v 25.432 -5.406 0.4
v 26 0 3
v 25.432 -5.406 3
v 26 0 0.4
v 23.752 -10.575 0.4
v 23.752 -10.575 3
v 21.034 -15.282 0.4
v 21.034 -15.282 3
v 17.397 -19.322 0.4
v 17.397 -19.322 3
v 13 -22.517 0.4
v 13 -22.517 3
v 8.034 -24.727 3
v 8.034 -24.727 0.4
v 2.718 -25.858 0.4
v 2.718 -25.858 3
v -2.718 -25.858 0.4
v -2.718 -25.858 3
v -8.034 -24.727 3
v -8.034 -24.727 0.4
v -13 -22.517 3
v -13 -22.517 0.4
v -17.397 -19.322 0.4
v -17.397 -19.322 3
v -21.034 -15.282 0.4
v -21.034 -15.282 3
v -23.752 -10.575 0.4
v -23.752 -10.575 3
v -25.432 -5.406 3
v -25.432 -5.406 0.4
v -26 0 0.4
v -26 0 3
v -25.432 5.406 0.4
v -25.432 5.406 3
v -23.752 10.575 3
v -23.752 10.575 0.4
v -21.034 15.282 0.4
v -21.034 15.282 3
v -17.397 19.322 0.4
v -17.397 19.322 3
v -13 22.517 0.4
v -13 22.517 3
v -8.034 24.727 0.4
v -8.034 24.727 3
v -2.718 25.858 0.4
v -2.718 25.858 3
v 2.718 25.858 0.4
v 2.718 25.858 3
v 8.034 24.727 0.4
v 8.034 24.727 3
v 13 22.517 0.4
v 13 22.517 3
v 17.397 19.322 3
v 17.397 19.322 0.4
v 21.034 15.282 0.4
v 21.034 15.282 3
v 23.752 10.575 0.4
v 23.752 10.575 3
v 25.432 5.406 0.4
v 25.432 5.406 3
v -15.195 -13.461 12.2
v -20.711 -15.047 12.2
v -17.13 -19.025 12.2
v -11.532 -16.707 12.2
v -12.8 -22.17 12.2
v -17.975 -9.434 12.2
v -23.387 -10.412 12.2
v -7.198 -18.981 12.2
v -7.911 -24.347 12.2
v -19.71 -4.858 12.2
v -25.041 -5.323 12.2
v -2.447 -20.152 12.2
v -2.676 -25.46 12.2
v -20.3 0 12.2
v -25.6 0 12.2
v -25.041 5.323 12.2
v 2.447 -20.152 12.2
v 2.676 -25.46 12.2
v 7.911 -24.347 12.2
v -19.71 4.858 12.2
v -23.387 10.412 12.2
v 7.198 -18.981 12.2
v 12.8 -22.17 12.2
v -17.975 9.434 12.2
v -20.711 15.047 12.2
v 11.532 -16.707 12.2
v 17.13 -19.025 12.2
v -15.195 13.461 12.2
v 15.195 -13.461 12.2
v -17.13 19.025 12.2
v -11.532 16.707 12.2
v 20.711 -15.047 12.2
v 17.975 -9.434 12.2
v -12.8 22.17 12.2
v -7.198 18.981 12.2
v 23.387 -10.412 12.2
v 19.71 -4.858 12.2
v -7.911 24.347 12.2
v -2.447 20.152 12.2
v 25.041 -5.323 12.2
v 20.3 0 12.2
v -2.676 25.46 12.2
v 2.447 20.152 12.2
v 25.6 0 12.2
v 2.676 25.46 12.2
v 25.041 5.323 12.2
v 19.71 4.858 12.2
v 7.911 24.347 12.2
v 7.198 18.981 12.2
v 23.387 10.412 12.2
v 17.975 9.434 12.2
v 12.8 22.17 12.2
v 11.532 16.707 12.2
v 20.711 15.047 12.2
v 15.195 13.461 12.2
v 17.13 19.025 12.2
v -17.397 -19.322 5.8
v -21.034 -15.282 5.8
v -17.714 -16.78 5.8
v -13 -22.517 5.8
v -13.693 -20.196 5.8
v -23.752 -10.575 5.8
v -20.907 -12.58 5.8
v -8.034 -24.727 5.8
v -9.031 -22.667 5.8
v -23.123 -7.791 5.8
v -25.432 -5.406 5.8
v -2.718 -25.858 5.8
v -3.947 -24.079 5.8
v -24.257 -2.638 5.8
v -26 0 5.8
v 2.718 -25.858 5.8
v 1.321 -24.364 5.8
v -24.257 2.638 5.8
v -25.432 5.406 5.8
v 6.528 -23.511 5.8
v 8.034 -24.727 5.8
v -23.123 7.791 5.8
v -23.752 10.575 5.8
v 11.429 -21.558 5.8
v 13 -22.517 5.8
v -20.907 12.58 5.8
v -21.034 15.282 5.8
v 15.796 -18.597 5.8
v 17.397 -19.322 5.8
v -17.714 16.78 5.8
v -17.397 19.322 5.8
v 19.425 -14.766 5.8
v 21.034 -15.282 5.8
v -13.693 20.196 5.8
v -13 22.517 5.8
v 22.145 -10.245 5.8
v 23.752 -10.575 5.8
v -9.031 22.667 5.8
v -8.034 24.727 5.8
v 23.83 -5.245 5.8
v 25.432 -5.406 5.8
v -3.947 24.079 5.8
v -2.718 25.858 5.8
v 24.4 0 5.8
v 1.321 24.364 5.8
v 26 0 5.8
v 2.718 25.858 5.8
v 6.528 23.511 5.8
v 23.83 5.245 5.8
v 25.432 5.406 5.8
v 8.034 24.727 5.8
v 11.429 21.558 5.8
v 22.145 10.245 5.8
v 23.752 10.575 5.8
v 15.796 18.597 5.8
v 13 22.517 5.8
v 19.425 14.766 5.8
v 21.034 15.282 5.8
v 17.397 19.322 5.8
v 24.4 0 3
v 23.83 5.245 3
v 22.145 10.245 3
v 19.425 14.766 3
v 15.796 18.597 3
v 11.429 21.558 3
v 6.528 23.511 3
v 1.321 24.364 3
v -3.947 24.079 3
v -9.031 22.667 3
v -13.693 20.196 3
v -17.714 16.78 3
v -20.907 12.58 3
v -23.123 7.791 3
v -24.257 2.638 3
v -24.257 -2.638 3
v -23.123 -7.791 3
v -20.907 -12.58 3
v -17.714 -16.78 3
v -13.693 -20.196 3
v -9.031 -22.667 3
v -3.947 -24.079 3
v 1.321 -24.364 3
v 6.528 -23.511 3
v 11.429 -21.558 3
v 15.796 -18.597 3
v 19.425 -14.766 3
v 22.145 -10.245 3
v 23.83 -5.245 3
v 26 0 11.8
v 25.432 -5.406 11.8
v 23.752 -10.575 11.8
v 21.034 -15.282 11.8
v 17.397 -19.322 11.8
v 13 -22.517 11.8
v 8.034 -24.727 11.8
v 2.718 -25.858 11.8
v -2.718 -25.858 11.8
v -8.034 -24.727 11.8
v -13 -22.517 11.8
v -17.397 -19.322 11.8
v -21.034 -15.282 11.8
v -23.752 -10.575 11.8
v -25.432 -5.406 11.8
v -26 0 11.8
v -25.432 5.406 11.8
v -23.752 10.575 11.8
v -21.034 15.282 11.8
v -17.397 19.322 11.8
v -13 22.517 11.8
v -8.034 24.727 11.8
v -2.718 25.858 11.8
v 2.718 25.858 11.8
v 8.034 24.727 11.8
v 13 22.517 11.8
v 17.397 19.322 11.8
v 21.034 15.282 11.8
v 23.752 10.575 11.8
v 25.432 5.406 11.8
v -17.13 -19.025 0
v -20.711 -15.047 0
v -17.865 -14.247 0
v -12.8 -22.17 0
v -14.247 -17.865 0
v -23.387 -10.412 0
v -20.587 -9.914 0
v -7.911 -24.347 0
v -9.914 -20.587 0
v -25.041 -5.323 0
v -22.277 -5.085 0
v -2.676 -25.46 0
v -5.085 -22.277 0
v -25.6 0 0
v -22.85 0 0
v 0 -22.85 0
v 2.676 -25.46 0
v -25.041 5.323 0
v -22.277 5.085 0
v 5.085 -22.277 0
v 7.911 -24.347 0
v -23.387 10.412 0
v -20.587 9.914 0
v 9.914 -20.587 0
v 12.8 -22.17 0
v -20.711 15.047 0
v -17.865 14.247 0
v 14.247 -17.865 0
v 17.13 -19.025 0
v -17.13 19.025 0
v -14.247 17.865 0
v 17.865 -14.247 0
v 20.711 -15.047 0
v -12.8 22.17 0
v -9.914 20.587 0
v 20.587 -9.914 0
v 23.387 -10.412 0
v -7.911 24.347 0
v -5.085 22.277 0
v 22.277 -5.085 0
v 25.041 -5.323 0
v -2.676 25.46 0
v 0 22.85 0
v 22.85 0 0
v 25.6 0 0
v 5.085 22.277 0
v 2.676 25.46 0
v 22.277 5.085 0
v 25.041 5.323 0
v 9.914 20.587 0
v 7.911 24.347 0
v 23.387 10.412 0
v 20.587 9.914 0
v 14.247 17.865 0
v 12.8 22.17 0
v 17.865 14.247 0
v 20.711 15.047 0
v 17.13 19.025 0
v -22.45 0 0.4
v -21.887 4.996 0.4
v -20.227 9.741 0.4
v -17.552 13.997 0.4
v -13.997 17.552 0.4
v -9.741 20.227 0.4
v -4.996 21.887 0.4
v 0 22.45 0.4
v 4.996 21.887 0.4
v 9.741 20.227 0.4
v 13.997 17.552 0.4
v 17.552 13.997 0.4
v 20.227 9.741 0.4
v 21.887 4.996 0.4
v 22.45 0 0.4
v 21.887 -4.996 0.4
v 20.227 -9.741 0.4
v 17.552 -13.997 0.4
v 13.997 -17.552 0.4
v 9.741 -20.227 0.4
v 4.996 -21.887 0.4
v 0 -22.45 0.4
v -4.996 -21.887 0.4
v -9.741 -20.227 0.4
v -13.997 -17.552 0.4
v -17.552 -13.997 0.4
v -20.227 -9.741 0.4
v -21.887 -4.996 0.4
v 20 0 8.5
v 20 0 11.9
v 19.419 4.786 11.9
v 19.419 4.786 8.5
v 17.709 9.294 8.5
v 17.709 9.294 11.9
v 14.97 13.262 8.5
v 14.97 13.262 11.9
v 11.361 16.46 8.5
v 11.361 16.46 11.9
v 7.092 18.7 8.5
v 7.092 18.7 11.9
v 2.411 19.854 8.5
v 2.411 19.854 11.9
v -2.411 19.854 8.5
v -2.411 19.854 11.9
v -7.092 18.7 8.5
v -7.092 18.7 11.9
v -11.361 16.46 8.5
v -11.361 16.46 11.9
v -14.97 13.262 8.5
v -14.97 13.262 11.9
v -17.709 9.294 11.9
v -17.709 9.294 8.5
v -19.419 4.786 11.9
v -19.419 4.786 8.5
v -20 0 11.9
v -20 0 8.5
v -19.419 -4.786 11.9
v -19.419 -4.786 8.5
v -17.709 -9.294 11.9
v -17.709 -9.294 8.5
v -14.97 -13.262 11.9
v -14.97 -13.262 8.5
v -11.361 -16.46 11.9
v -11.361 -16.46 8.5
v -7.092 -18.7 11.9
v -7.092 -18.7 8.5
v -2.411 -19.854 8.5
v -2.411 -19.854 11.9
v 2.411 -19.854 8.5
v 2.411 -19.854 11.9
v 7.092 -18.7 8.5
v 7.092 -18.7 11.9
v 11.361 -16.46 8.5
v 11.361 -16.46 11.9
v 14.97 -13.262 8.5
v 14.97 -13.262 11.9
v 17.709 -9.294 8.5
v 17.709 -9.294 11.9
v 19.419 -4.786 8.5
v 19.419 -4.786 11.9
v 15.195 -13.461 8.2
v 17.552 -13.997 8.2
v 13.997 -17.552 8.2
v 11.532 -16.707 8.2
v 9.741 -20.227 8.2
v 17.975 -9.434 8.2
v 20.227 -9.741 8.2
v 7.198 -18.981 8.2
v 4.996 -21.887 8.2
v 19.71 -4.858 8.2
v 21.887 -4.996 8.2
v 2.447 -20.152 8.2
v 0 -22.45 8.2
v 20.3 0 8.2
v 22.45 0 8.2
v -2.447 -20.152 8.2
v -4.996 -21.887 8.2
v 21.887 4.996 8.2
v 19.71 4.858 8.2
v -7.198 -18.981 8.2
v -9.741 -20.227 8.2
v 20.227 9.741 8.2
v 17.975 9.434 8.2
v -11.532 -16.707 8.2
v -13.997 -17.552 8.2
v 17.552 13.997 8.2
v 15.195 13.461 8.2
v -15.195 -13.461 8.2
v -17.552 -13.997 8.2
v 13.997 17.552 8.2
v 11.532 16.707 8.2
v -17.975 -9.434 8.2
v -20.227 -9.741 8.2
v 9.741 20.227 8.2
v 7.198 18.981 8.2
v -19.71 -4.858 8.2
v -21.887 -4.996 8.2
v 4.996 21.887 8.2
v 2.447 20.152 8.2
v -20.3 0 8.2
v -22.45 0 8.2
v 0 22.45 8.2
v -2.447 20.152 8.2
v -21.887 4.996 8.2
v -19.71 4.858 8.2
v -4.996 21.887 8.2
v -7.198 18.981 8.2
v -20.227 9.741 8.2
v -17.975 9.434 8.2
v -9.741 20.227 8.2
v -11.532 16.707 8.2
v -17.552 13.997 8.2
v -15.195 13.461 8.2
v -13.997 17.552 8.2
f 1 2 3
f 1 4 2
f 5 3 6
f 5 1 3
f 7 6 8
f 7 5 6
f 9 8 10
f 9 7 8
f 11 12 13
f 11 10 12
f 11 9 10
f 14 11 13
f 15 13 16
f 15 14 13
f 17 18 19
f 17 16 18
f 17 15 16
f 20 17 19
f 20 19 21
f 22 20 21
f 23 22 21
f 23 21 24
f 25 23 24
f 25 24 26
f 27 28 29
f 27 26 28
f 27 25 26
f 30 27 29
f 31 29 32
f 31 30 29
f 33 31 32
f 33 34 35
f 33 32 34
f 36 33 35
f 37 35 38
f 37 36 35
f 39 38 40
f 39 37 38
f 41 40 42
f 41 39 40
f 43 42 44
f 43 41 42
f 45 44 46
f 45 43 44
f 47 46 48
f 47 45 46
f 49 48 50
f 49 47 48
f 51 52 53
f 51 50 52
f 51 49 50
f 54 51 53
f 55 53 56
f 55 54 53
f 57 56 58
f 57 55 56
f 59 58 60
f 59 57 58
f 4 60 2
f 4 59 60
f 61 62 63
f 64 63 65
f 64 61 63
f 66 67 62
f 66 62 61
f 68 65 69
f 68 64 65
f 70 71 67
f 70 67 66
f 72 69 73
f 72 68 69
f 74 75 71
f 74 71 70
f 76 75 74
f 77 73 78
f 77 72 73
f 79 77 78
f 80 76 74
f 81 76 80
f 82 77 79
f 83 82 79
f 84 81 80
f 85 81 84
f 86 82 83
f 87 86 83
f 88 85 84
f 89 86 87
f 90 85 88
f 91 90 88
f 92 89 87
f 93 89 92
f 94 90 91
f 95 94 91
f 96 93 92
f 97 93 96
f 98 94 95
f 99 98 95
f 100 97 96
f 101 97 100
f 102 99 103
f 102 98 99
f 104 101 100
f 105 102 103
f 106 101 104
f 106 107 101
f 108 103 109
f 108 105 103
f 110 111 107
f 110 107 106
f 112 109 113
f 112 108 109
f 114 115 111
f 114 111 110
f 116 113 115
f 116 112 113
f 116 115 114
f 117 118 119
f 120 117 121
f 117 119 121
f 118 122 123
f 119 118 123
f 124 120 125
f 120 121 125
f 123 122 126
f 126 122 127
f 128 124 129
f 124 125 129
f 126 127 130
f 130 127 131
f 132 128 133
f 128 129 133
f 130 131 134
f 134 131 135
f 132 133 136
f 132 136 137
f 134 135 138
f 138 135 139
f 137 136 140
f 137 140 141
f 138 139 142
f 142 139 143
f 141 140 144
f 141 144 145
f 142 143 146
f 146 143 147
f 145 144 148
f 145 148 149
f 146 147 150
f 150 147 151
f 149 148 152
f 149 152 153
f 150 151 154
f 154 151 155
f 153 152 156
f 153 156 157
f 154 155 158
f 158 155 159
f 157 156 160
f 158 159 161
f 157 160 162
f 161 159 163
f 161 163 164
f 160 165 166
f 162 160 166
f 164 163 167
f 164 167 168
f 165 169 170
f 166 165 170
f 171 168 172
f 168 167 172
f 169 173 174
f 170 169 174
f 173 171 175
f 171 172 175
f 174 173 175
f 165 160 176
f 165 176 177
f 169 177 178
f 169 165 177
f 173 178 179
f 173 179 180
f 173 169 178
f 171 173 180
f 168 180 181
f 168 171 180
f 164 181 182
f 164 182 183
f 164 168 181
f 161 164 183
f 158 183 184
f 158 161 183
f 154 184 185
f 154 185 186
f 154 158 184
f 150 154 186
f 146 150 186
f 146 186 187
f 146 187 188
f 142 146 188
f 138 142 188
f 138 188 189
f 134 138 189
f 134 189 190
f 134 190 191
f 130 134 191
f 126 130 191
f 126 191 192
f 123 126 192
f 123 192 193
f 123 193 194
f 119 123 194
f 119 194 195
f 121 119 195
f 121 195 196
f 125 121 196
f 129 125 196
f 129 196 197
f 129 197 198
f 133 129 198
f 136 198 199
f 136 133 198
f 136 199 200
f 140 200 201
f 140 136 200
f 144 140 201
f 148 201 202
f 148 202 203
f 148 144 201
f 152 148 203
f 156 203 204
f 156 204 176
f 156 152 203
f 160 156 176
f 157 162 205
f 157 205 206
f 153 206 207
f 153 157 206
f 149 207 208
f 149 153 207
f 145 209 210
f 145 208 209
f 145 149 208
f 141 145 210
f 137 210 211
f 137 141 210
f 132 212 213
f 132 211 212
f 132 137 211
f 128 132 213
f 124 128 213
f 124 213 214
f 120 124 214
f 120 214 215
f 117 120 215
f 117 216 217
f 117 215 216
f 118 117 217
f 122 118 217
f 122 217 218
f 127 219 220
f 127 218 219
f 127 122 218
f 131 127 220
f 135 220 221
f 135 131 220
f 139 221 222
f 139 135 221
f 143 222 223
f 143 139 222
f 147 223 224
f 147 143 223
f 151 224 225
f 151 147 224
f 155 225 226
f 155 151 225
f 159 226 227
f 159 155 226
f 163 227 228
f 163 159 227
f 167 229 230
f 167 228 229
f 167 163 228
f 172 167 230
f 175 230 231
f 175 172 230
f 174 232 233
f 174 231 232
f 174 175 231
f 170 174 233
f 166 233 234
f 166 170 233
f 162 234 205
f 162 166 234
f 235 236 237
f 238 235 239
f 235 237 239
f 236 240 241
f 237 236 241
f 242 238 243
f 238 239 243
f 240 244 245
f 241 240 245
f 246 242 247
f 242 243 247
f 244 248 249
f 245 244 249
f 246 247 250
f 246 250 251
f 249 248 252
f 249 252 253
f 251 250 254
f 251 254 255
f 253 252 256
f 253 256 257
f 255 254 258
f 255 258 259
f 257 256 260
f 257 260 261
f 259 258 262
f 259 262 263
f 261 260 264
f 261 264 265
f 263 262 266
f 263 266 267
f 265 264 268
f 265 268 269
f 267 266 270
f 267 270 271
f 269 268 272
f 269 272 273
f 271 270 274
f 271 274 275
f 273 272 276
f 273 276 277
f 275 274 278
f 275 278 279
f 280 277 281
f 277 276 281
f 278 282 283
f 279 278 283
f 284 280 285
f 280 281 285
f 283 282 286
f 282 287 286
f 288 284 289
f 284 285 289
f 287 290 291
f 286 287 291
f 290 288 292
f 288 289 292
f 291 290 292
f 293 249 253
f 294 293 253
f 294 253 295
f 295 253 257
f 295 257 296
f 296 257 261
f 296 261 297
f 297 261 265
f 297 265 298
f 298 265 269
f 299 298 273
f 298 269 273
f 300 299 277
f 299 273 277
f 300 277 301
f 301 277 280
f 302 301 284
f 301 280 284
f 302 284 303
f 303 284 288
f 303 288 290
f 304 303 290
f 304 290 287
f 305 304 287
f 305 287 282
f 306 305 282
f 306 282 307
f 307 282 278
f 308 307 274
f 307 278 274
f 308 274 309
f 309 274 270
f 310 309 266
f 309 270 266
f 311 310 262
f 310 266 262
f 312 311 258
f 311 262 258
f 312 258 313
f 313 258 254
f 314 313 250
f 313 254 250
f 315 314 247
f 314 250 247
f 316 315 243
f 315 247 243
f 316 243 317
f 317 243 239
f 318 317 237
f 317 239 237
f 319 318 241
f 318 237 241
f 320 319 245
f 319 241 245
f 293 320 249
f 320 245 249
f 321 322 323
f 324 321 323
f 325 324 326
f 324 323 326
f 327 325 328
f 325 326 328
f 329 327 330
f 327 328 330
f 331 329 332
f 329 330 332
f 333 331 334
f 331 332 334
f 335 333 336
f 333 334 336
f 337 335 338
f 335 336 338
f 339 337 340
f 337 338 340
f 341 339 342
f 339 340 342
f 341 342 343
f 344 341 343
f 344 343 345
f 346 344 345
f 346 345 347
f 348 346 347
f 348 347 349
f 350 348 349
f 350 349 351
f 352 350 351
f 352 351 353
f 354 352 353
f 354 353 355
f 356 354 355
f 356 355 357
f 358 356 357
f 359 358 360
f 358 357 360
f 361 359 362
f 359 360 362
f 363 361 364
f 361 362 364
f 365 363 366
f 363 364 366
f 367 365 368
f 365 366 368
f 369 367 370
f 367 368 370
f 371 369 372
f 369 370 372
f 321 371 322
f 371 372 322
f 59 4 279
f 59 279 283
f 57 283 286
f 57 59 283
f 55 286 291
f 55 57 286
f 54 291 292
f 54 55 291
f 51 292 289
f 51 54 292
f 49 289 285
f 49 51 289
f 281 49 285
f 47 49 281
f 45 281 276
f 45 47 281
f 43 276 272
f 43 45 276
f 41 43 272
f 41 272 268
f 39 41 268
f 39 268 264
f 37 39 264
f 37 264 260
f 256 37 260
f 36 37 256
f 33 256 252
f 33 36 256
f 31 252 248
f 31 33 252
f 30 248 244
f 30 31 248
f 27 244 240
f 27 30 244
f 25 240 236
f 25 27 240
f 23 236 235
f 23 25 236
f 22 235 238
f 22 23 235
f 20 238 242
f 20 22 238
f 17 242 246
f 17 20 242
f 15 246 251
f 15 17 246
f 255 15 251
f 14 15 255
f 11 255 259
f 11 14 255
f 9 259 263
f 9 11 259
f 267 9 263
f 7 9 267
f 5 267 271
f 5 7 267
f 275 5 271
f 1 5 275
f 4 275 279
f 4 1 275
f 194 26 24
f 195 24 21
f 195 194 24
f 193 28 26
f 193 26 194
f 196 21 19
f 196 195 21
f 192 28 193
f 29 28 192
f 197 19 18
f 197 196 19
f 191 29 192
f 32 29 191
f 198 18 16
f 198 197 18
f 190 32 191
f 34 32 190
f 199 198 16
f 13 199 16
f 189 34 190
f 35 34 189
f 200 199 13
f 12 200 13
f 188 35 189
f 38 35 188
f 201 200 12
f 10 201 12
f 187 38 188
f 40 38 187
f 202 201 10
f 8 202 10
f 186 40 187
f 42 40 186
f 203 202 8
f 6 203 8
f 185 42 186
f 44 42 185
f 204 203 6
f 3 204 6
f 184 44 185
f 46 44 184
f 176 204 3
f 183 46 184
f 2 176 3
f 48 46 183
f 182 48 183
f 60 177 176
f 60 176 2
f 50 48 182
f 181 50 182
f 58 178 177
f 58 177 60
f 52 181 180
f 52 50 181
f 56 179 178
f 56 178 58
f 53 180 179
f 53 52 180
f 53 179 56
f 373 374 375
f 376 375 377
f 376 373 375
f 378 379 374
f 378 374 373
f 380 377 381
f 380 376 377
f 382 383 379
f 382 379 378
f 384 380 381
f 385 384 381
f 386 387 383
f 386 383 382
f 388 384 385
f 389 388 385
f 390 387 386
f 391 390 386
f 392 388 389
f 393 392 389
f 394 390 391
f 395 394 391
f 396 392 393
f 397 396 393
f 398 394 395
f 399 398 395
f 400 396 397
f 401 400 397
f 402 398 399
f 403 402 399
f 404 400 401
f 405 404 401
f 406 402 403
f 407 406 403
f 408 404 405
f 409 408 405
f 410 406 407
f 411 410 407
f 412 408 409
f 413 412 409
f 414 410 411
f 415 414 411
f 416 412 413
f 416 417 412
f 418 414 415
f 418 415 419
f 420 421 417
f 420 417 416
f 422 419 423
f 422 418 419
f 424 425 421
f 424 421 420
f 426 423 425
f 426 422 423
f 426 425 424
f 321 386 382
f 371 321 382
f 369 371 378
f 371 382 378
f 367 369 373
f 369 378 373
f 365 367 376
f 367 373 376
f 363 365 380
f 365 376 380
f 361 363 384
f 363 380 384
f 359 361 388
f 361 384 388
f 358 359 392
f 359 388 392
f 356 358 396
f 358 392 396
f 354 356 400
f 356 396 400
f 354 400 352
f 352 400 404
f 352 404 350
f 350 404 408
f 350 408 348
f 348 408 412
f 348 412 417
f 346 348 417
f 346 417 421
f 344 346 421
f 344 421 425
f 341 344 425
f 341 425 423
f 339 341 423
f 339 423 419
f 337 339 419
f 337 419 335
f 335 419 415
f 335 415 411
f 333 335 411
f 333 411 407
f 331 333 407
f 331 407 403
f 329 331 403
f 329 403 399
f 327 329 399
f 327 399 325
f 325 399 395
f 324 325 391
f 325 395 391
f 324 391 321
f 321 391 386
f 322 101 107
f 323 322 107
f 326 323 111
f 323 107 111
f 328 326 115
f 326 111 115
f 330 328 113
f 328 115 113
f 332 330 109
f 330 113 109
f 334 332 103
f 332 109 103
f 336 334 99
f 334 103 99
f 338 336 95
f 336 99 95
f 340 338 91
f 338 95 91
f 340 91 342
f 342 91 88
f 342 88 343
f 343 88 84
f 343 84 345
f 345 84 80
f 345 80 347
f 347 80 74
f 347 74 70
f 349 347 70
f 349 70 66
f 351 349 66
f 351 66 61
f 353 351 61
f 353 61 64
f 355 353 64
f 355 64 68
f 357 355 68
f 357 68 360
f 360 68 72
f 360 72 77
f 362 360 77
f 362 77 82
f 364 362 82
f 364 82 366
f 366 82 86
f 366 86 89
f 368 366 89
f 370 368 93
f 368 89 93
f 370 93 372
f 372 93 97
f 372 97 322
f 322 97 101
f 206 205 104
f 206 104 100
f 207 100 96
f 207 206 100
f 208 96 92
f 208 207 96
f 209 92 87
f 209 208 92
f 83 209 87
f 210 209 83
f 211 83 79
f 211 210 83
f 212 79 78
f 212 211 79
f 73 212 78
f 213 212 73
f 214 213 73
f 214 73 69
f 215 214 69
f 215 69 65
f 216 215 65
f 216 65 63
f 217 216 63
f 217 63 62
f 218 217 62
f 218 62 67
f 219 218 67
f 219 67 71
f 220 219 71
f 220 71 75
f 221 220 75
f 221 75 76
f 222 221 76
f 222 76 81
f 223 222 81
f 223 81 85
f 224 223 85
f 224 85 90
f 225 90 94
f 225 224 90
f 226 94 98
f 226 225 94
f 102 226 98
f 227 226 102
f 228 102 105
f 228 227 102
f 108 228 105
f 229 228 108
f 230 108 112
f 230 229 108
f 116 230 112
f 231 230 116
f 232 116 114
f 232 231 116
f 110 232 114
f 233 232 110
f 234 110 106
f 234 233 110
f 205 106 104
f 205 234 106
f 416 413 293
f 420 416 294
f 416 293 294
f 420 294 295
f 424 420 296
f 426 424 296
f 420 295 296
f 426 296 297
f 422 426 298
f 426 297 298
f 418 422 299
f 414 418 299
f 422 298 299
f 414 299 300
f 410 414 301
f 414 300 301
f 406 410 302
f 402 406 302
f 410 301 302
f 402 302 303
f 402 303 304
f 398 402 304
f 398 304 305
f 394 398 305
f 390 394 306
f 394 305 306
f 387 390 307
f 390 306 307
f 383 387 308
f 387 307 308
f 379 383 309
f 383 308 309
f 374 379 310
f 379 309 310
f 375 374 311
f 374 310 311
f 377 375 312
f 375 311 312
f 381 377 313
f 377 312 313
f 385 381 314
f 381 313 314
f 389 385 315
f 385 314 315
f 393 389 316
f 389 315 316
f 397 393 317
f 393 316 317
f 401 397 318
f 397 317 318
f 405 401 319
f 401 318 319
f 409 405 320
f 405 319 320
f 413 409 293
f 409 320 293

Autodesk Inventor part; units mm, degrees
ref_plane "YZ Plane" through (0, 0, 0) normal (1, 0, 0) x (0, 1, 0)
ref_plane "XZ Plane" through (0, 0, 0) normal (0, 1, 0) x (-1, 0, 0)
sketch "草圖1" plane through (0, 0, 0) normal (0, 0, 1) x (1, 0, 0)
  circle A0 centre (0, 0) radius 26
  dimension "d0" = 52
extrude "擠出1" add sketch "草圖1" along normal blind 12.2
sketch "草圖2" plane through (0, 0, 12.2) normal (0, 0, 1) x (1, 0, 0)
  circle A0 centre (0, 0) radius 26 projected
  circle A1 centre (0, 0) radius 20
  dimension "d3" = 40
extrude "擠出2" cut sketch "草圖2" against normal through all contours A1
sketch "草圖3" plane through (0, 0, 0) normal (0, 0, -1) x (-1, 0, 0)
  circle A0 centre (0, 0) radius 20 projected
  circle A1 centre (0, 0) radius 26 projected
  circle A2 centre (0, 0) radius 22.45
  dimension "d6" = 44.9
extrude "擠出3" cut sketch "草圖3" against normal blind 8.2 contours A2
ref_plane "工作平面1" through (0, 0, 5.8) normal (0, 0, 1) x (1, 0, 0)
sketch "草圖4" plane through (0, 0, 5.8) normal (0, 0, 1) x (1, 0, 0)
  circle A0 centre (0, 0) radius 24.4
  circle A1 centre (0, 0) radius 26 projected
  dimension "d10" = 48.8
extrude "擠出4" cut sketch "草圖4" against normal blind 2.8
chamfer "倒角1" distance 0.4 angle 45 3 edges at (-26, 0, 12.2) (-26, 0, 0) (22.45, 0, 0)
chamfer "倒角2" distance 0.3 angle 45 2 edges at (-20, 0, 8.2) (-20, 0, 12.2)
properties part number "鑄鐵SLEEVE"
